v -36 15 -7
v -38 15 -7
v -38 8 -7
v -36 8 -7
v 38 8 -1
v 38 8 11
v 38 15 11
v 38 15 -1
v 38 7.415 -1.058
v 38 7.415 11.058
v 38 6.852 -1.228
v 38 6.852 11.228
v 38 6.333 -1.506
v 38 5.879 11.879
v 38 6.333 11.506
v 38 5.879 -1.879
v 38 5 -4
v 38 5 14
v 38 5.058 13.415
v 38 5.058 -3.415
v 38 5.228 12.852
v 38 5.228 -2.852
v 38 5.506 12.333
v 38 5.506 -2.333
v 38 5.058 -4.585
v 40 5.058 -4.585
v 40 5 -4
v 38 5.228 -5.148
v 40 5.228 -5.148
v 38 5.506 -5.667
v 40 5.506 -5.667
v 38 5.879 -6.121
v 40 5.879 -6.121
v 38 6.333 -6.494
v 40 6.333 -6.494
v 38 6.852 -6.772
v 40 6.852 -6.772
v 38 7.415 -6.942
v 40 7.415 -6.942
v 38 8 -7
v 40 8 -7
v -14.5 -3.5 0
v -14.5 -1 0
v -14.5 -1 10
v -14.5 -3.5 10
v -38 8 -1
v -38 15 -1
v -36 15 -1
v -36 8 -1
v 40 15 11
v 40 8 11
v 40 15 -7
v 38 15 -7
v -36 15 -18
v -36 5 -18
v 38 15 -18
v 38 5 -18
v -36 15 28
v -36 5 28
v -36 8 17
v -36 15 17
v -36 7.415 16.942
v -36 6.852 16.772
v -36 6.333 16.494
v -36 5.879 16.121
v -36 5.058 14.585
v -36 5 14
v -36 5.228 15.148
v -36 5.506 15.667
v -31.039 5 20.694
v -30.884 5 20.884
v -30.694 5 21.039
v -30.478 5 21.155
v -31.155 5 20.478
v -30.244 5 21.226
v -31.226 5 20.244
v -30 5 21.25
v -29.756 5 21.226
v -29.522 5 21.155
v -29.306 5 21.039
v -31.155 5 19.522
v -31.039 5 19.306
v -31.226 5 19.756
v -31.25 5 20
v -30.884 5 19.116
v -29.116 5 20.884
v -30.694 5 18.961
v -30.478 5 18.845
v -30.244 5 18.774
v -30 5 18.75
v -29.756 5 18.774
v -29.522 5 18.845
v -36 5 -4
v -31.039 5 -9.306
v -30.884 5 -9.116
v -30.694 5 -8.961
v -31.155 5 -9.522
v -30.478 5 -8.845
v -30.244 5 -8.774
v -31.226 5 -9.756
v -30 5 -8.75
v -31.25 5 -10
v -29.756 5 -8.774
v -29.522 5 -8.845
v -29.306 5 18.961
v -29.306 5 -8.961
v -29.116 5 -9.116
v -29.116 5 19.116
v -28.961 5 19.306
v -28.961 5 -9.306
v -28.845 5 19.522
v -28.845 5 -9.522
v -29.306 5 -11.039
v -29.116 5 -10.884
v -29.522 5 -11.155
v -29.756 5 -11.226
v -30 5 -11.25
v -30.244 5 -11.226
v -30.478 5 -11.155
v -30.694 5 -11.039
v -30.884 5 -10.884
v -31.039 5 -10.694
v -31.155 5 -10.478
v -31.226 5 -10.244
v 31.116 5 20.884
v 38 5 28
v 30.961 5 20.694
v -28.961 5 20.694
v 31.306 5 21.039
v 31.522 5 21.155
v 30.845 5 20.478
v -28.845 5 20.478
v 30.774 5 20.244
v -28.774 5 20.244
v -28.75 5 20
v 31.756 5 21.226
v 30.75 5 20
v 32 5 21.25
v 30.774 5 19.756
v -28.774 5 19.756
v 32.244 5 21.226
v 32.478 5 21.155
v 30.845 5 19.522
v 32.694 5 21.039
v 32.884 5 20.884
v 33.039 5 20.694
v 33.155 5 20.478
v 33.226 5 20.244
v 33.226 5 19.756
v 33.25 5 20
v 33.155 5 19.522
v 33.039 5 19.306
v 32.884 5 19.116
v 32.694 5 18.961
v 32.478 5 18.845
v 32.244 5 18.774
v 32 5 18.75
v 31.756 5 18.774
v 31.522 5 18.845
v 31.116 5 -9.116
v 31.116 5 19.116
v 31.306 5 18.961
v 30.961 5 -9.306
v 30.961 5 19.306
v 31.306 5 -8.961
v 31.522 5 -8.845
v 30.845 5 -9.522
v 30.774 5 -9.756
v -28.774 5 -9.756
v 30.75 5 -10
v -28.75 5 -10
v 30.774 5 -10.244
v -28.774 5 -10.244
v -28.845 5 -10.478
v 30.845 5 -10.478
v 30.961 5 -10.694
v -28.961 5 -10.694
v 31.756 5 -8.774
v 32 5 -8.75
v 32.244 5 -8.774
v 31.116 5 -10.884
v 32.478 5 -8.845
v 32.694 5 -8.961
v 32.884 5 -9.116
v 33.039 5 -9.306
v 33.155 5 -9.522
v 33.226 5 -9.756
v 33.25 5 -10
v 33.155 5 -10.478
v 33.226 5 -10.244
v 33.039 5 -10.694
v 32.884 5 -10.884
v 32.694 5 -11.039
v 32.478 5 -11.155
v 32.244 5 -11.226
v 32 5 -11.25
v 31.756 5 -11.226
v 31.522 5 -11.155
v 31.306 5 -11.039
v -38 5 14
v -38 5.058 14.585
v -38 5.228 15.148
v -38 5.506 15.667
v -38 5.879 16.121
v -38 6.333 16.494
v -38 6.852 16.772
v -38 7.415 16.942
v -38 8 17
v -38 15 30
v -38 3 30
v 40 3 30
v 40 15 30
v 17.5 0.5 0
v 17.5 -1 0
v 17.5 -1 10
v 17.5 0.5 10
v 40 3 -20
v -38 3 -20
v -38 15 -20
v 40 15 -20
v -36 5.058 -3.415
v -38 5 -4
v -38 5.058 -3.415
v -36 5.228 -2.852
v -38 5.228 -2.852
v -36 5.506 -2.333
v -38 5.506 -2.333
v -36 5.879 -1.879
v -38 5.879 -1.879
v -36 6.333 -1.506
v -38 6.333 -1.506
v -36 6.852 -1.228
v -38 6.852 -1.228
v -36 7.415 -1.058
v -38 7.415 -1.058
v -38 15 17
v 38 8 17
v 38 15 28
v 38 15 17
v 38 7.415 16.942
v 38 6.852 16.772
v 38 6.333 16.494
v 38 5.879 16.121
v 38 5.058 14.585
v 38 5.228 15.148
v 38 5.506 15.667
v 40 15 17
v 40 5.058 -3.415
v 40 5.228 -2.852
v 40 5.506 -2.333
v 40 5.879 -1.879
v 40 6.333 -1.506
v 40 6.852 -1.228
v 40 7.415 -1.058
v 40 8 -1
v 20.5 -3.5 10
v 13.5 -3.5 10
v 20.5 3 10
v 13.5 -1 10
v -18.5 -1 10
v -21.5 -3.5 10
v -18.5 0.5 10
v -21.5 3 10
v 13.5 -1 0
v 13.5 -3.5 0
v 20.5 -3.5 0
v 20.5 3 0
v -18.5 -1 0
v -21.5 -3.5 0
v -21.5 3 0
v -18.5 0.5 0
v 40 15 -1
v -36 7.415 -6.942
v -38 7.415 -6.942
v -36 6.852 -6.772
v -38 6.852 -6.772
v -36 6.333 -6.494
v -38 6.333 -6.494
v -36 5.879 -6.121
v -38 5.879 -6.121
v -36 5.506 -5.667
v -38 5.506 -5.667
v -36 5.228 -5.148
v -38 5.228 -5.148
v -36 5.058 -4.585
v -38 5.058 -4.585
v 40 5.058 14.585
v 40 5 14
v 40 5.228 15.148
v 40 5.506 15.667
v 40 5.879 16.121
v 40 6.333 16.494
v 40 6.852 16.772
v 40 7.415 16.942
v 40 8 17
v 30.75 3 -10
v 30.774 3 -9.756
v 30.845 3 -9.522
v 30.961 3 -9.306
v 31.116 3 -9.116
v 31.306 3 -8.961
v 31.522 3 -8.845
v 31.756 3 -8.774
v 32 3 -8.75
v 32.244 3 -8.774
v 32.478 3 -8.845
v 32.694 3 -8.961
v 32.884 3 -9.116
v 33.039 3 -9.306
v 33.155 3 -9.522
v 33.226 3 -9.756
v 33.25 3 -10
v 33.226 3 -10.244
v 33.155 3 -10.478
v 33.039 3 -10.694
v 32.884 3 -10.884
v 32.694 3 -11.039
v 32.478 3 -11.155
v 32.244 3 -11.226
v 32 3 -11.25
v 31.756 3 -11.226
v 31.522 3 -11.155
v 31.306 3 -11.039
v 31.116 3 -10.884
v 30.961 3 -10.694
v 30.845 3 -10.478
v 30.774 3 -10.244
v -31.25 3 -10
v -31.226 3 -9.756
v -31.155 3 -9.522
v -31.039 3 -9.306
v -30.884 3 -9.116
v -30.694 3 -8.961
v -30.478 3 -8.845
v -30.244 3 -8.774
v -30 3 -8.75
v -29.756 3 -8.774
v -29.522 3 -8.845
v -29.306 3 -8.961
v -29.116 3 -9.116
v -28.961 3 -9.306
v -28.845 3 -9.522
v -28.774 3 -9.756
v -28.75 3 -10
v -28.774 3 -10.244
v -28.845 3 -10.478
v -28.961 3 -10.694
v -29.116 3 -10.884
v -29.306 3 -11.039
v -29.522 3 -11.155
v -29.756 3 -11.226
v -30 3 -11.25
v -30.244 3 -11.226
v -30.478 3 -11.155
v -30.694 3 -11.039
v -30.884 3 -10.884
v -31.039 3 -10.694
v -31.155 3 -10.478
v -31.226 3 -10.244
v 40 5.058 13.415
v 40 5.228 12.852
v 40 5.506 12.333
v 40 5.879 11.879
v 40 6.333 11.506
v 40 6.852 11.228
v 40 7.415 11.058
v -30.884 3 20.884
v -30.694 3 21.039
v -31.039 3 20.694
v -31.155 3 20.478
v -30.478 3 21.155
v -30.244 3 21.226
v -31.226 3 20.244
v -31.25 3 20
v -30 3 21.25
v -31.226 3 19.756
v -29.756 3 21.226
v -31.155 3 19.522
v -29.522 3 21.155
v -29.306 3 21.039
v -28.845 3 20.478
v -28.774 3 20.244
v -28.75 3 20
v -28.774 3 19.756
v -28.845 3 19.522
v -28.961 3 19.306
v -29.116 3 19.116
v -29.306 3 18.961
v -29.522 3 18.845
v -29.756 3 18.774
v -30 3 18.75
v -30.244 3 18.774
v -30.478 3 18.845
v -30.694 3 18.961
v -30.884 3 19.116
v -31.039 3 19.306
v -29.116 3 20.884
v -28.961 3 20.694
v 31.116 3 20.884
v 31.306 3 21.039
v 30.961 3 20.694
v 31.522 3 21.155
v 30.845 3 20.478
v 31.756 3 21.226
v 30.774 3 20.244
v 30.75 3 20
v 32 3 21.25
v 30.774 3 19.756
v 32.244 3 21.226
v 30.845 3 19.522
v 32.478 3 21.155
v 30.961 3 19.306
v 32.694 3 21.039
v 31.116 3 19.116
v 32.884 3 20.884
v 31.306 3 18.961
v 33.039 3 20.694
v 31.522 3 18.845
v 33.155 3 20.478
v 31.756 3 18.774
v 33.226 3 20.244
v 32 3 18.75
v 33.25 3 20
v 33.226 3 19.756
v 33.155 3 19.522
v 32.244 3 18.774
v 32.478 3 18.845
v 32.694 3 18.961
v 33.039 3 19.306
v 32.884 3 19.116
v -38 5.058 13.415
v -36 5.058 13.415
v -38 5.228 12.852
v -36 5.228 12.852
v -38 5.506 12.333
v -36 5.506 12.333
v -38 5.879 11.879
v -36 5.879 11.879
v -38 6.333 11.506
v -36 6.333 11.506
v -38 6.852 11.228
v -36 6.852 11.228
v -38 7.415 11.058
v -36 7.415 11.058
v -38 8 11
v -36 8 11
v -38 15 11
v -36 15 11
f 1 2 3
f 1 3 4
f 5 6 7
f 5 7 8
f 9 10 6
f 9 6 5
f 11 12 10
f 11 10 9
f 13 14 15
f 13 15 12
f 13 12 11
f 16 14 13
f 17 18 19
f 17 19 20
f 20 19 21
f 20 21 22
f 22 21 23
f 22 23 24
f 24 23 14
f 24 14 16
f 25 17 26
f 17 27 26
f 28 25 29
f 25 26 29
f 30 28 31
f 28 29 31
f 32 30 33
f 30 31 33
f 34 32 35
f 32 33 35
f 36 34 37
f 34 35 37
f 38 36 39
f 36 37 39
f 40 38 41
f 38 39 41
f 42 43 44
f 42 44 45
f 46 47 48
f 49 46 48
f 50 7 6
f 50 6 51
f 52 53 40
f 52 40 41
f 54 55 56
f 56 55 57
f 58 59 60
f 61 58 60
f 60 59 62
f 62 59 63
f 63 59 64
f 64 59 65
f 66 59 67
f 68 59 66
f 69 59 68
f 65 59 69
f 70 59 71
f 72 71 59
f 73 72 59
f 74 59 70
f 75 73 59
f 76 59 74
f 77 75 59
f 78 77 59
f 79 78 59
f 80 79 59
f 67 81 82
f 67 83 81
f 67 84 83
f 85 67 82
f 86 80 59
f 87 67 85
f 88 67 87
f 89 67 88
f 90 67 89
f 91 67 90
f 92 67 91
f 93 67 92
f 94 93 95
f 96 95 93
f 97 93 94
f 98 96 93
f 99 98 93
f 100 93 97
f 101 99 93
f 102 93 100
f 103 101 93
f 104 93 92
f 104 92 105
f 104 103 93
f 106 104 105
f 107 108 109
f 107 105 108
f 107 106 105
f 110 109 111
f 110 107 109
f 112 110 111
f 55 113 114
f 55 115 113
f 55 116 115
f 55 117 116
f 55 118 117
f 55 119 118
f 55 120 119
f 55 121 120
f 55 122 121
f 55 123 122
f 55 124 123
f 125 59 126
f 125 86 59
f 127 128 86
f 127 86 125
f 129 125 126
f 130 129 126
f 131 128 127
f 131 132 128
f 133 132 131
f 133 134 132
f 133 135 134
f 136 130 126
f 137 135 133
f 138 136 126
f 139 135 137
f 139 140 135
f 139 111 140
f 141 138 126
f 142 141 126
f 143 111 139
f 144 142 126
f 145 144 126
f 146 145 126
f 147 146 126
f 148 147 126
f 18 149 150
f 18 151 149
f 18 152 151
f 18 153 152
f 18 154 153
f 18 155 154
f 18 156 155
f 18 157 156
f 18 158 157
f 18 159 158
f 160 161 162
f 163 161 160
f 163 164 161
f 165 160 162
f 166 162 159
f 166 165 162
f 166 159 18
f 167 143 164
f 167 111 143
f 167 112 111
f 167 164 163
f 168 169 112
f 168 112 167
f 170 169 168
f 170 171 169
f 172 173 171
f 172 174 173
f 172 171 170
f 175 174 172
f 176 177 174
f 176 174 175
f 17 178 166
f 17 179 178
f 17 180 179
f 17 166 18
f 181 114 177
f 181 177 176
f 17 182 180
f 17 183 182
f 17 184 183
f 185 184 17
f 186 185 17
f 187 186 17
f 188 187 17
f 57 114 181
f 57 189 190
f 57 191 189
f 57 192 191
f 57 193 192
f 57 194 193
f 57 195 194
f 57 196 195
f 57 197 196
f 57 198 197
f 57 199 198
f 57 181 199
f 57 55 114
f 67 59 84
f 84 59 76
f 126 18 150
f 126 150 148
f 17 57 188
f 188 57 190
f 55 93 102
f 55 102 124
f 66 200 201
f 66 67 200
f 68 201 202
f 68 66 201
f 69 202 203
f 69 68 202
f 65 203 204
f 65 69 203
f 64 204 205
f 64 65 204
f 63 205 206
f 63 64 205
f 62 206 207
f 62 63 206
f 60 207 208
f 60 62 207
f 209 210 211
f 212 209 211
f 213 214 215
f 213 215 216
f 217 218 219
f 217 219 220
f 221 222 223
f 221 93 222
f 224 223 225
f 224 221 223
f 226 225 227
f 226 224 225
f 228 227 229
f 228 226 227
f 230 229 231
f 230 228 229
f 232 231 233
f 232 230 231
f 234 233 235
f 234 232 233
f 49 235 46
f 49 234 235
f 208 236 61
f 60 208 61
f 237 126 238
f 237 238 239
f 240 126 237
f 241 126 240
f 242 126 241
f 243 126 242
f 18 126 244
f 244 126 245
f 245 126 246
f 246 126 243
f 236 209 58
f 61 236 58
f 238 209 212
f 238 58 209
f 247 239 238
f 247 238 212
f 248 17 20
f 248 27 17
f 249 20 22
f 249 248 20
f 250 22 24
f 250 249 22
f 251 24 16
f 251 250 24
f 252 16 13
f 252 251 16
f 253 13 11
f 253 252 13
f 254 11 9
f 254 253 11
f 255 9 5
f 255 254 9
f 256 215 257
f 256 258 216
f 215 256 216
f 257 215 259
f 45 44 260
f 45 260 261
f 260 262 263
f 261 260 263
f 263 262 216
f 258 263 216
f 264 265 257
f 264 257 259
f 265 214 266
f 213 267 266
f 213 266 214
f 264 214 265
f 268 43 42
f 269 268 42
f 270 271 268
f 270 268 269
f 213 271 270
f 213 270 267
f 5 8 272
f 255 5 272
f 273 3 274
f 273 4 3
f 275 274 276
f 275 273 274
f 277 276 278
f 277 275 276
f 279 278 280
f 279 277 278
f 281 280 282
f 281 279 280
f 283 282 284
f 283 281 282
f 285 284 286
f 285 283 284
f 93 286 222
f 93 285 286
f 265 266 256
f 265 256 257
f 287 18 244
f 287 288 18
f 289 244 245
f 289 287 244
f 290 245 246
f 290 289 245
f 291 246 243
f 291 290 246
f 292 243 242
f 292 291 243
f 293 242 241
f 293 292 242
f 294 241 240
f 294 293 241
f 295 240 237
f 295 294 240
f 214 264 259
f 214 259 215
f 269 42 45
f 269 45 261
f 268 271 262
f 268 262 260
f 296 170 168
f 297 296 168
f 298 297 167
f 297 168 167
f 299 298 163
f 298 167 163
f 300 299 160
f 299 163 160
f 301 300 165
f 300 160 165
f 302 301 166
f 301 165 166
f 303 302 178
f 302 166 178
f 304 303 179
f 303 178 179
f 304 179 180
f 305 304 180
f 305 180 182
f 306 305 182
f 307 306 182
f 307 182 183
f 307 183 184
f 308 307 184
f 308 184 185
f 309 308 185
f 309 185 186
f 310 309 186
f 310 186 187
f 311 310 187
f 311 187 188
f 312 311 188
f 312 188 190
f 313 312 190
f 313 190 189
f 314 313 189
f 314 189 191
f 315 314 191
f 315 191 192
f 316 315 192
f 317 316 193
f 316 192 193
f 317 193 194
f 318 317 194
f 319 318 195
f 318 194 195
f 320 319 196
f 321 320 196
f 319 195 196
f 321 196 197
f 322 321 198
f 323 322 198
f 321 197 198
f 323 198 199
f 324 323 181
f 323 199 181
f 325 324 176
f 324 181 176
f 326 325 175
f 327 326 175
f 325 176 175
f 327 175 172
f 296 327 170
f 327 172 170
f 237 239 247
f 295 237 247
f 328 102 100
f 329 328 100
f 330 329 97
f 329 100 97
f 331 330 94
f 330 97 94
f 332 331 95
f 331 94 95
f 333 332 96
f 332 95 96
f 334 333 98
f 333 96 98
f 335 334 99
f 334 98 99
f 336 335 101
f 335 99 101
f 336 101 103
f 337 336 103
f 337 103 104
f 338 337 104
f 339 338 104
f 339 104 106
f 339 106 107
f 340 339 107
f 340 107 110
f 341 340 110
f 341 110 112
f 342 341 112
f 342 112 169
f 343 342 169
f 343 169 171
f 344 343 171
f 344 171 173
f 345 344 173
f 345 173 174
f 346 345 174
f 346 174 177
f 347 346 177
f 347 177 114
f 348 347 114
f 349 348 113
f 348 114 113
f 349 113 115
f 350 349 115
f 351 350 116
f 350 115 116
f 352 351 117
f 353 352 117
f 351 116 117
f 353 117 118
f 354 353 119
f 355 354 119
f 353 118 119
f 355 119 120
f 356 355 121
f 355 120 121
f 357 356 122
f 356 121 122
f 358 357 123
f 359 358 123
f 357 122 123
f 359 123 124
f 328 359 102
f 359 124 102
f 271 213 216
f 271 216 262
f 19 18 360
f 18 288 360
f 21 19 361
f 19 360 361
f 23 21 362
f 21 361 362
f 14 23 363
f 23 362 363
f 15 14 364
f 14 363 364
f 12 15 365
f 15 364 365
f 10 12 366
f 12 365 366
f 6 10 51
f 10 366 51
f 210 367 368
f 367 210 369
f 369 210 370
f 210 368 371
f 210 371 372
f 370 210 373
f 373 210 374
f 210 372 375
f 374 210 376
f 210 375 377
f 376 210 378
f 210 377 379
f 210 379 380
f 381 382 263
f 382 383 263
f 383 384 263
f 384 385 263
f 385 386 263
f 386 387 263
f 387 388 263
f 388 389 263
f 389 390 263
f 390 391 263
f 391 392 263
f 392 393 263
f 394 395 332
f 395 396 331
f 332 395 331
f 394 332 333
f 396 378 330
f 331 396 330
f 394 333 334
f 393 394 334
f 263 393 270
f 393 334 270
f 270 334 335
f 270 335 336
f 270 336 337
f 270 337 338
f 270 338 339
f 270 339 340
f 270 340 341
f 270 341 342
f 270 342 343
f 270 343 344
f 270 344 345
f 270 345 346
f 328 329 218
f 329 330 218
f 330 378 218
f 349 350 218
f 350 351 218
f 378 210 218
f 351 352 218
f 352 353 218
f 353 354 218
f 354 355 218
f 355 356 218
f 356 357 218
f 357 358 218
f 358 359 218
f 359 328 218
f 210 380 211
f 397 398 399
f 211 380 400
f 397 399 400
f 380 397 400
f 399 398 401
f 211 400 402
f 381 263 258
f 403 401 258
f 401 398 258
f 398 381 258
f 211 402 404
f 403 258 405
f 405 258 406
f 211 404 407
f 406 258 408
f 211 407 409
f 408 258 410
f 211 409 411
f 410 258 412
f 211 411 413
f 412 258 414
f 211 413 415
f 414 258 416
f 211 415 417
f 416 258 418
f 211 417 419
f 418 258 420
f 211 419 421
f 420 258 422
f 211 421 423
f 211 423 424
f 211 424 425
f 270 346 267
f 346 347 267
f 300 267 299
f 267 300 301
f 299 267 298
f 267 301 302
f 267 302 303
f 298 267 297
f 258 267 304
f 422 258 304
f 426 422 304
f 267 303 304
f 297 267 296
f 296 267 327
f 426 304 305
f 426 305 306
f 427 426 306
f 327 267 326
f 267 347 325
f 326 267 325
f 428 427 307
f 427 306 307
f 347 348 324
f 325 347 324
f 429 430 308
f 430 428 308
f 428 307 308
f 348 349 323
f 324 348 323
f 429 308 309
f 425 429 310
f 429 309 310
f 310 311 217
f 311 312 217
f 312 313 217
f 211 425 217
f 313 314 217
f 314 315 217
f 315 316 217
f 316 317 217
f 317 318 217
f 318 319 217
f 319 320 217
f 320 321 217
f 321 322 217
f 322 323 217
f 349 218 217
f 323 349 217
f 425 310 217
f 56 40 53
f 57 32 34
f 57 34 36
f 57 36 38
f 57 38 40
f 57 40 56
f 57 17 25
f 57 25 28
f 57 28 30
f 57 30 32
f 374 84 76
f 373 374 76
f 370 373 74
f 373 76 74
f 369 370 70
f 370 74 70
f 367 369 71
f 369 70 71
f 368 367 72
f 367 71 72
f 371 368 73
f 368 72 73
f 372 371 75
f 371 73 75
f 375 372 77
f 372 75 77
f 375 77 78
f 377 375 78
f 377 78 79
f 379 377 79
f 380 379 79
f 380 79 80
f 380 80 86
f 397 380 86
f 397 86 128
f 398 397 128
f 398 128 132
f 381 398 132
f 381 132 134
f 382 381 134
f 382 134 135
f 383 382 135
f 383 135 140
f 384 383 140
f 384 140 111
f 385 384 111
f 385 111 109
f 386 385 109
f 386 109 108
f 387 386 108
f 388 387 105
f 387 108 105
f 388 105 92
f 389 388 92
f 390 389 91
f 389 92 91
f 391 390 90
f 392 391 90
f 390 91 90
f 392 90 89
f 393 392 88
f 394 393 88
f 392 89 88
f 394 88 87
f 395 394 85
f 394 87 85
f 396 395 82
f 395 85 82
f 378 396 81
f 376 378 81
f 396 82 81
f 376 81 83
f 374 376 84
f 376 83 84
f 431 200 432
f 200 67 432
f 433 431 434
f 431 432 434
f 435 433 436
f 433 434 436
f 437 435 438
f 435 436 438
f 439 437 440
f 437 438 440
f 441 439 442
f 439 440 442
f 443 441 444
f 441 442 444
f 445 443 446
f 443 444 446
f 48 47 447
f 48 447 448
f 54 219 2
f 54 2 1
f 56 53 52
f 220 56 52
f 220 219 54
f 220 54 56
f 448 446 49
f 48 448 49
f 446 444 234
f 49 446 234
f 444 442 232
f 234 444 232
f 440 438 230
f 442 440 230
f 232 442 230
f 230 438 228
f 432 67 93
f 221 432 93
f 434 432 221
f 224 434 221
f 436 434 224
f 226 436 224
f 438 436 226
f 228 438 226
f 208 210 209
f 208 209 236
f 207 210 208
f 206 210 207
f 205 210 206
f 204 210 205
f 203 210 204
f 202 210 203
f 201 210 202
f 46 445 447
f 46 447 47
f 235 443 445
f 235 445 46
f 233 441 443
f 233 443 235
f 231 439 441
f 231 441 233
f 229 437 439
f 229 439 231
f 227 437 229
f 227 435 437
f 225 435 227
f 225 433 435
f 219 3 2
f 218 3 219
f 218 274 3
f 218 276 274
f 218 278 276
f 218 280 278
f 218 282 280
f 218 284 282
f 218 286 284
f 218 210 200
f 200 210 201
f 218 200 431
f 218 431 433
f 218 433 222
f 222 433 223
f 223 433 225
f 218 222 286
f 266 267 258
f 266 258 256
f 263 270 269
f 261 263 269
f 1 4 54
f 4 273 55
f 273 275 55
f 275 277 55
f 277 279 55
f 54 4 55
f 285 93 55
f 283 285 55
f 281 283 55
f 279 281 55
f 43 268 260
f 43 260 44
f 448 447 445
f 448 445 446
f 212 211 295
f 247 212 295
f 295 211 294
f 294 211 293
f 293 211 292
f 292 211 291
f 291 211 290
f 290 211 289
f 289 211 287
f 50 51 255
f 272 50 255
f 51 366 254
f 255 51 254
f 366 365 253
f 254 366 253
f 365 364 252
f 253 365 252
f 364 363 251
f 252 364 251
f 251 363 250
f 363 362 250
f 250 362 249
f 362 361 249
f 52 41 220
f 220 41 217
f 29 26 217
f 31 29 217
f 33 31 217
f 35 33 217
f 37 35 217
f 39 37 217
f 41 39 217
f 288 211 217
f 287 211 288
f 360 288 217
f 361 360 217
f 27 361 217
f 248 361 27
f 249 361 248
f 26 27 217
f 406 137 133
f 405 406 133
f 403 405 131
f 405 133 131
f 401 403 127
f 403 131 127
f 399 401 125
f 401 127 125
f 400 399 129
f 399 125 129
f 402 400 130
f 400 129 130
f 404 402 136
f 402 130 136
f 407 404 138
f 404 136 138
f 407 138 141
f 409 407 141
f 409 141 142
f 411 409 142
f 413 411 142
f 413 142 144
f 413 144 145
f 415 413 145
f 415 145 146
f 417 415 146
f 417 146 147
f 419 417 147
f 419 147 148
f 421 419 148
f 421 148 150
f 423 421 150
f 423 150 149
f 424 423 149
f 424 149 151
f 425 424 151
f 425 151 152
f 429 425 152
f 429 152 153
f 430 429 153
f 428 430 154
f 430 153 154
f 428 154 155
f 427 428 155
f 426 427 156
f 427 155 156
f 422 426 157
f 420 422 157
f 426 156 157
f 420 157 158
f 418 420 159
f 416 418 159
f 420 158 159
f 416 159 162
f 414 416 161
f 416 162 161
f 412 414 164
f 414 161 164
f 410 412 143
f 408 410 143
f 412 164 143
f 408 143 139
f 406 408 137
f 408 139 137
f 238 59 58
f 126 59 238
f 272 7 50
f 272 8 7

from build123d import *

# Parameters (mm, degrees)
BOSS_EXTRUDE1_DEPTH      = 10
SKETCH3_W                = 74
SKETCH3_H                = 46
BOSS_EXTRUDE2_DEPTH      = 2
SKETCH4_R                = 1.25
CUT_EXTRUDE1_DEPTH       = 10
BOSS_EXTRUDE3_DEPTH      = 10
BOSS_EXTRUDE3_DEPTH_BACK = 2
SKETCH5_W                = 78
SKETCH5_H                = 50
SKETCH5_W_2              = 74
SKETCH5_H_2              = 46
SKETCH9_W                = 86.285123911
SKETCH9_H                = 6
SKETCH9_W_2              = 83.939508892
CUT_EXTRUDE2_DEPTH       = 10
FILLET1_R                = 3


with BuildPart() as part:
    # Sketch2 → Boss-Extrude1 (new body)
    with BuildSketch(Plane.XY):
        Polygon((-18.5, 0.5), (-18.5, -1), (-14.5, -1), (-14.5, -3.5), (-21.5, -3.5), (-21.5, -1), (-21.5, 3), (20.5, 3), (20.5, -3.5), (13.5, -3.5), (13.5, -1), (17.5, -1), (17.5, 0.5), align=None)
    extrude(amount=BOSS_EXTRUDE1_DEPTH)

    # Sketch3 → Boss-Extrude2 (add)
    with BuildSketch(Plane(origin=(0, 3, 0), x_dir=(1, 0, 0), z_dir=(0, 1, 0))):
        with Locations((1, -5)):
            Rectangle(SKETCH3_W, SKETCH3_H)
    extrude(amount=BOSS_EXTRUDE2_DEPTH)

    # Sketch4 → Cut-Extrude1 (cut)
    with BuildSketch(Plane(origin=(0, 5, 0), x_dir=(1, 0, 0), z_dir=(0, 1, 0))):
        with Locations(Location((-30, 10, 0), (0, 0, 180))):
            Circle(SKETCH4_R)
        with Locations(Location((-30, -20, 0), (0, 0, 180))):
            Circle(SKETCH4_R)
        with Locations(Location((32, 10, 0), (0, 0, 180))):
            Circle(SKETCH4_R)
        with Locations(Location((32, -20, 0), (0, 0, 180))):
            Circle(SKETCH4_R)
    extrude(amount=-CUT_EXTRUDE1_DEPTH, mode=Mode.SUBTRACT)

    # Sketch5 → Boss-Extrude3 (add, two sides: drawn at the far end of the back side and taken through both)
    with BuildSketch(Plane(origin=(0, 5, 0), x_dir=(1, 0, 0), z_dir=(0, 1, 0)).offset(-BOSS_EXTRUDE3_DEPTH_BACK)):
        with Locations((1, -5)):
            Rectangle(SKETCH5_W, SKETCH5_H)
        with Locations((1, -5)):
            Rectangle(SKETCH5_W_2, SKETCH5_H_2, mode=Mode.SUBTRACT)
    extrude(amount=BOSS_EXTRUDE3_DEPTH + BOSS_EXTRUDE3_DEPTH_BACK)

    # Sketch9 → Cut-Extrude2 (cut)
    with BuildSketch(Plane(origin=(0, 15, 0), x_dir=(1, 0, 0), z_dir=(0, 1, 0))):
        with Locations((1.40422043, 4)):
            Rectangle(SKETCH9_W, SKETCH9_H)
        with Locations((0.90158864, -14)):
            Rectangle(SKETCH9_W_2, SKETCH9_H)
    extrude(amount=-CUT_EXTRUDE2_DEPTH, mode=Mode.SUBTRACT)

    # Fillet1
    fillet1_edges = [part.edges().sort_by_distance(p)[0] for p in [
        (-37, 5, 17),
        (-37, 5, 11),
        (-37, 5, -7),
        (-37, 5, -1),
        (39, 5, 17),
        (39, 5, 11),
        (39, 5, -7),
        (39, 5, -1),
    ]]
    fillet(fillet1_edges, radius=FILLET1_R - 0.0001)  # a hair under: the kernel refuses the full size


solid = part.part
